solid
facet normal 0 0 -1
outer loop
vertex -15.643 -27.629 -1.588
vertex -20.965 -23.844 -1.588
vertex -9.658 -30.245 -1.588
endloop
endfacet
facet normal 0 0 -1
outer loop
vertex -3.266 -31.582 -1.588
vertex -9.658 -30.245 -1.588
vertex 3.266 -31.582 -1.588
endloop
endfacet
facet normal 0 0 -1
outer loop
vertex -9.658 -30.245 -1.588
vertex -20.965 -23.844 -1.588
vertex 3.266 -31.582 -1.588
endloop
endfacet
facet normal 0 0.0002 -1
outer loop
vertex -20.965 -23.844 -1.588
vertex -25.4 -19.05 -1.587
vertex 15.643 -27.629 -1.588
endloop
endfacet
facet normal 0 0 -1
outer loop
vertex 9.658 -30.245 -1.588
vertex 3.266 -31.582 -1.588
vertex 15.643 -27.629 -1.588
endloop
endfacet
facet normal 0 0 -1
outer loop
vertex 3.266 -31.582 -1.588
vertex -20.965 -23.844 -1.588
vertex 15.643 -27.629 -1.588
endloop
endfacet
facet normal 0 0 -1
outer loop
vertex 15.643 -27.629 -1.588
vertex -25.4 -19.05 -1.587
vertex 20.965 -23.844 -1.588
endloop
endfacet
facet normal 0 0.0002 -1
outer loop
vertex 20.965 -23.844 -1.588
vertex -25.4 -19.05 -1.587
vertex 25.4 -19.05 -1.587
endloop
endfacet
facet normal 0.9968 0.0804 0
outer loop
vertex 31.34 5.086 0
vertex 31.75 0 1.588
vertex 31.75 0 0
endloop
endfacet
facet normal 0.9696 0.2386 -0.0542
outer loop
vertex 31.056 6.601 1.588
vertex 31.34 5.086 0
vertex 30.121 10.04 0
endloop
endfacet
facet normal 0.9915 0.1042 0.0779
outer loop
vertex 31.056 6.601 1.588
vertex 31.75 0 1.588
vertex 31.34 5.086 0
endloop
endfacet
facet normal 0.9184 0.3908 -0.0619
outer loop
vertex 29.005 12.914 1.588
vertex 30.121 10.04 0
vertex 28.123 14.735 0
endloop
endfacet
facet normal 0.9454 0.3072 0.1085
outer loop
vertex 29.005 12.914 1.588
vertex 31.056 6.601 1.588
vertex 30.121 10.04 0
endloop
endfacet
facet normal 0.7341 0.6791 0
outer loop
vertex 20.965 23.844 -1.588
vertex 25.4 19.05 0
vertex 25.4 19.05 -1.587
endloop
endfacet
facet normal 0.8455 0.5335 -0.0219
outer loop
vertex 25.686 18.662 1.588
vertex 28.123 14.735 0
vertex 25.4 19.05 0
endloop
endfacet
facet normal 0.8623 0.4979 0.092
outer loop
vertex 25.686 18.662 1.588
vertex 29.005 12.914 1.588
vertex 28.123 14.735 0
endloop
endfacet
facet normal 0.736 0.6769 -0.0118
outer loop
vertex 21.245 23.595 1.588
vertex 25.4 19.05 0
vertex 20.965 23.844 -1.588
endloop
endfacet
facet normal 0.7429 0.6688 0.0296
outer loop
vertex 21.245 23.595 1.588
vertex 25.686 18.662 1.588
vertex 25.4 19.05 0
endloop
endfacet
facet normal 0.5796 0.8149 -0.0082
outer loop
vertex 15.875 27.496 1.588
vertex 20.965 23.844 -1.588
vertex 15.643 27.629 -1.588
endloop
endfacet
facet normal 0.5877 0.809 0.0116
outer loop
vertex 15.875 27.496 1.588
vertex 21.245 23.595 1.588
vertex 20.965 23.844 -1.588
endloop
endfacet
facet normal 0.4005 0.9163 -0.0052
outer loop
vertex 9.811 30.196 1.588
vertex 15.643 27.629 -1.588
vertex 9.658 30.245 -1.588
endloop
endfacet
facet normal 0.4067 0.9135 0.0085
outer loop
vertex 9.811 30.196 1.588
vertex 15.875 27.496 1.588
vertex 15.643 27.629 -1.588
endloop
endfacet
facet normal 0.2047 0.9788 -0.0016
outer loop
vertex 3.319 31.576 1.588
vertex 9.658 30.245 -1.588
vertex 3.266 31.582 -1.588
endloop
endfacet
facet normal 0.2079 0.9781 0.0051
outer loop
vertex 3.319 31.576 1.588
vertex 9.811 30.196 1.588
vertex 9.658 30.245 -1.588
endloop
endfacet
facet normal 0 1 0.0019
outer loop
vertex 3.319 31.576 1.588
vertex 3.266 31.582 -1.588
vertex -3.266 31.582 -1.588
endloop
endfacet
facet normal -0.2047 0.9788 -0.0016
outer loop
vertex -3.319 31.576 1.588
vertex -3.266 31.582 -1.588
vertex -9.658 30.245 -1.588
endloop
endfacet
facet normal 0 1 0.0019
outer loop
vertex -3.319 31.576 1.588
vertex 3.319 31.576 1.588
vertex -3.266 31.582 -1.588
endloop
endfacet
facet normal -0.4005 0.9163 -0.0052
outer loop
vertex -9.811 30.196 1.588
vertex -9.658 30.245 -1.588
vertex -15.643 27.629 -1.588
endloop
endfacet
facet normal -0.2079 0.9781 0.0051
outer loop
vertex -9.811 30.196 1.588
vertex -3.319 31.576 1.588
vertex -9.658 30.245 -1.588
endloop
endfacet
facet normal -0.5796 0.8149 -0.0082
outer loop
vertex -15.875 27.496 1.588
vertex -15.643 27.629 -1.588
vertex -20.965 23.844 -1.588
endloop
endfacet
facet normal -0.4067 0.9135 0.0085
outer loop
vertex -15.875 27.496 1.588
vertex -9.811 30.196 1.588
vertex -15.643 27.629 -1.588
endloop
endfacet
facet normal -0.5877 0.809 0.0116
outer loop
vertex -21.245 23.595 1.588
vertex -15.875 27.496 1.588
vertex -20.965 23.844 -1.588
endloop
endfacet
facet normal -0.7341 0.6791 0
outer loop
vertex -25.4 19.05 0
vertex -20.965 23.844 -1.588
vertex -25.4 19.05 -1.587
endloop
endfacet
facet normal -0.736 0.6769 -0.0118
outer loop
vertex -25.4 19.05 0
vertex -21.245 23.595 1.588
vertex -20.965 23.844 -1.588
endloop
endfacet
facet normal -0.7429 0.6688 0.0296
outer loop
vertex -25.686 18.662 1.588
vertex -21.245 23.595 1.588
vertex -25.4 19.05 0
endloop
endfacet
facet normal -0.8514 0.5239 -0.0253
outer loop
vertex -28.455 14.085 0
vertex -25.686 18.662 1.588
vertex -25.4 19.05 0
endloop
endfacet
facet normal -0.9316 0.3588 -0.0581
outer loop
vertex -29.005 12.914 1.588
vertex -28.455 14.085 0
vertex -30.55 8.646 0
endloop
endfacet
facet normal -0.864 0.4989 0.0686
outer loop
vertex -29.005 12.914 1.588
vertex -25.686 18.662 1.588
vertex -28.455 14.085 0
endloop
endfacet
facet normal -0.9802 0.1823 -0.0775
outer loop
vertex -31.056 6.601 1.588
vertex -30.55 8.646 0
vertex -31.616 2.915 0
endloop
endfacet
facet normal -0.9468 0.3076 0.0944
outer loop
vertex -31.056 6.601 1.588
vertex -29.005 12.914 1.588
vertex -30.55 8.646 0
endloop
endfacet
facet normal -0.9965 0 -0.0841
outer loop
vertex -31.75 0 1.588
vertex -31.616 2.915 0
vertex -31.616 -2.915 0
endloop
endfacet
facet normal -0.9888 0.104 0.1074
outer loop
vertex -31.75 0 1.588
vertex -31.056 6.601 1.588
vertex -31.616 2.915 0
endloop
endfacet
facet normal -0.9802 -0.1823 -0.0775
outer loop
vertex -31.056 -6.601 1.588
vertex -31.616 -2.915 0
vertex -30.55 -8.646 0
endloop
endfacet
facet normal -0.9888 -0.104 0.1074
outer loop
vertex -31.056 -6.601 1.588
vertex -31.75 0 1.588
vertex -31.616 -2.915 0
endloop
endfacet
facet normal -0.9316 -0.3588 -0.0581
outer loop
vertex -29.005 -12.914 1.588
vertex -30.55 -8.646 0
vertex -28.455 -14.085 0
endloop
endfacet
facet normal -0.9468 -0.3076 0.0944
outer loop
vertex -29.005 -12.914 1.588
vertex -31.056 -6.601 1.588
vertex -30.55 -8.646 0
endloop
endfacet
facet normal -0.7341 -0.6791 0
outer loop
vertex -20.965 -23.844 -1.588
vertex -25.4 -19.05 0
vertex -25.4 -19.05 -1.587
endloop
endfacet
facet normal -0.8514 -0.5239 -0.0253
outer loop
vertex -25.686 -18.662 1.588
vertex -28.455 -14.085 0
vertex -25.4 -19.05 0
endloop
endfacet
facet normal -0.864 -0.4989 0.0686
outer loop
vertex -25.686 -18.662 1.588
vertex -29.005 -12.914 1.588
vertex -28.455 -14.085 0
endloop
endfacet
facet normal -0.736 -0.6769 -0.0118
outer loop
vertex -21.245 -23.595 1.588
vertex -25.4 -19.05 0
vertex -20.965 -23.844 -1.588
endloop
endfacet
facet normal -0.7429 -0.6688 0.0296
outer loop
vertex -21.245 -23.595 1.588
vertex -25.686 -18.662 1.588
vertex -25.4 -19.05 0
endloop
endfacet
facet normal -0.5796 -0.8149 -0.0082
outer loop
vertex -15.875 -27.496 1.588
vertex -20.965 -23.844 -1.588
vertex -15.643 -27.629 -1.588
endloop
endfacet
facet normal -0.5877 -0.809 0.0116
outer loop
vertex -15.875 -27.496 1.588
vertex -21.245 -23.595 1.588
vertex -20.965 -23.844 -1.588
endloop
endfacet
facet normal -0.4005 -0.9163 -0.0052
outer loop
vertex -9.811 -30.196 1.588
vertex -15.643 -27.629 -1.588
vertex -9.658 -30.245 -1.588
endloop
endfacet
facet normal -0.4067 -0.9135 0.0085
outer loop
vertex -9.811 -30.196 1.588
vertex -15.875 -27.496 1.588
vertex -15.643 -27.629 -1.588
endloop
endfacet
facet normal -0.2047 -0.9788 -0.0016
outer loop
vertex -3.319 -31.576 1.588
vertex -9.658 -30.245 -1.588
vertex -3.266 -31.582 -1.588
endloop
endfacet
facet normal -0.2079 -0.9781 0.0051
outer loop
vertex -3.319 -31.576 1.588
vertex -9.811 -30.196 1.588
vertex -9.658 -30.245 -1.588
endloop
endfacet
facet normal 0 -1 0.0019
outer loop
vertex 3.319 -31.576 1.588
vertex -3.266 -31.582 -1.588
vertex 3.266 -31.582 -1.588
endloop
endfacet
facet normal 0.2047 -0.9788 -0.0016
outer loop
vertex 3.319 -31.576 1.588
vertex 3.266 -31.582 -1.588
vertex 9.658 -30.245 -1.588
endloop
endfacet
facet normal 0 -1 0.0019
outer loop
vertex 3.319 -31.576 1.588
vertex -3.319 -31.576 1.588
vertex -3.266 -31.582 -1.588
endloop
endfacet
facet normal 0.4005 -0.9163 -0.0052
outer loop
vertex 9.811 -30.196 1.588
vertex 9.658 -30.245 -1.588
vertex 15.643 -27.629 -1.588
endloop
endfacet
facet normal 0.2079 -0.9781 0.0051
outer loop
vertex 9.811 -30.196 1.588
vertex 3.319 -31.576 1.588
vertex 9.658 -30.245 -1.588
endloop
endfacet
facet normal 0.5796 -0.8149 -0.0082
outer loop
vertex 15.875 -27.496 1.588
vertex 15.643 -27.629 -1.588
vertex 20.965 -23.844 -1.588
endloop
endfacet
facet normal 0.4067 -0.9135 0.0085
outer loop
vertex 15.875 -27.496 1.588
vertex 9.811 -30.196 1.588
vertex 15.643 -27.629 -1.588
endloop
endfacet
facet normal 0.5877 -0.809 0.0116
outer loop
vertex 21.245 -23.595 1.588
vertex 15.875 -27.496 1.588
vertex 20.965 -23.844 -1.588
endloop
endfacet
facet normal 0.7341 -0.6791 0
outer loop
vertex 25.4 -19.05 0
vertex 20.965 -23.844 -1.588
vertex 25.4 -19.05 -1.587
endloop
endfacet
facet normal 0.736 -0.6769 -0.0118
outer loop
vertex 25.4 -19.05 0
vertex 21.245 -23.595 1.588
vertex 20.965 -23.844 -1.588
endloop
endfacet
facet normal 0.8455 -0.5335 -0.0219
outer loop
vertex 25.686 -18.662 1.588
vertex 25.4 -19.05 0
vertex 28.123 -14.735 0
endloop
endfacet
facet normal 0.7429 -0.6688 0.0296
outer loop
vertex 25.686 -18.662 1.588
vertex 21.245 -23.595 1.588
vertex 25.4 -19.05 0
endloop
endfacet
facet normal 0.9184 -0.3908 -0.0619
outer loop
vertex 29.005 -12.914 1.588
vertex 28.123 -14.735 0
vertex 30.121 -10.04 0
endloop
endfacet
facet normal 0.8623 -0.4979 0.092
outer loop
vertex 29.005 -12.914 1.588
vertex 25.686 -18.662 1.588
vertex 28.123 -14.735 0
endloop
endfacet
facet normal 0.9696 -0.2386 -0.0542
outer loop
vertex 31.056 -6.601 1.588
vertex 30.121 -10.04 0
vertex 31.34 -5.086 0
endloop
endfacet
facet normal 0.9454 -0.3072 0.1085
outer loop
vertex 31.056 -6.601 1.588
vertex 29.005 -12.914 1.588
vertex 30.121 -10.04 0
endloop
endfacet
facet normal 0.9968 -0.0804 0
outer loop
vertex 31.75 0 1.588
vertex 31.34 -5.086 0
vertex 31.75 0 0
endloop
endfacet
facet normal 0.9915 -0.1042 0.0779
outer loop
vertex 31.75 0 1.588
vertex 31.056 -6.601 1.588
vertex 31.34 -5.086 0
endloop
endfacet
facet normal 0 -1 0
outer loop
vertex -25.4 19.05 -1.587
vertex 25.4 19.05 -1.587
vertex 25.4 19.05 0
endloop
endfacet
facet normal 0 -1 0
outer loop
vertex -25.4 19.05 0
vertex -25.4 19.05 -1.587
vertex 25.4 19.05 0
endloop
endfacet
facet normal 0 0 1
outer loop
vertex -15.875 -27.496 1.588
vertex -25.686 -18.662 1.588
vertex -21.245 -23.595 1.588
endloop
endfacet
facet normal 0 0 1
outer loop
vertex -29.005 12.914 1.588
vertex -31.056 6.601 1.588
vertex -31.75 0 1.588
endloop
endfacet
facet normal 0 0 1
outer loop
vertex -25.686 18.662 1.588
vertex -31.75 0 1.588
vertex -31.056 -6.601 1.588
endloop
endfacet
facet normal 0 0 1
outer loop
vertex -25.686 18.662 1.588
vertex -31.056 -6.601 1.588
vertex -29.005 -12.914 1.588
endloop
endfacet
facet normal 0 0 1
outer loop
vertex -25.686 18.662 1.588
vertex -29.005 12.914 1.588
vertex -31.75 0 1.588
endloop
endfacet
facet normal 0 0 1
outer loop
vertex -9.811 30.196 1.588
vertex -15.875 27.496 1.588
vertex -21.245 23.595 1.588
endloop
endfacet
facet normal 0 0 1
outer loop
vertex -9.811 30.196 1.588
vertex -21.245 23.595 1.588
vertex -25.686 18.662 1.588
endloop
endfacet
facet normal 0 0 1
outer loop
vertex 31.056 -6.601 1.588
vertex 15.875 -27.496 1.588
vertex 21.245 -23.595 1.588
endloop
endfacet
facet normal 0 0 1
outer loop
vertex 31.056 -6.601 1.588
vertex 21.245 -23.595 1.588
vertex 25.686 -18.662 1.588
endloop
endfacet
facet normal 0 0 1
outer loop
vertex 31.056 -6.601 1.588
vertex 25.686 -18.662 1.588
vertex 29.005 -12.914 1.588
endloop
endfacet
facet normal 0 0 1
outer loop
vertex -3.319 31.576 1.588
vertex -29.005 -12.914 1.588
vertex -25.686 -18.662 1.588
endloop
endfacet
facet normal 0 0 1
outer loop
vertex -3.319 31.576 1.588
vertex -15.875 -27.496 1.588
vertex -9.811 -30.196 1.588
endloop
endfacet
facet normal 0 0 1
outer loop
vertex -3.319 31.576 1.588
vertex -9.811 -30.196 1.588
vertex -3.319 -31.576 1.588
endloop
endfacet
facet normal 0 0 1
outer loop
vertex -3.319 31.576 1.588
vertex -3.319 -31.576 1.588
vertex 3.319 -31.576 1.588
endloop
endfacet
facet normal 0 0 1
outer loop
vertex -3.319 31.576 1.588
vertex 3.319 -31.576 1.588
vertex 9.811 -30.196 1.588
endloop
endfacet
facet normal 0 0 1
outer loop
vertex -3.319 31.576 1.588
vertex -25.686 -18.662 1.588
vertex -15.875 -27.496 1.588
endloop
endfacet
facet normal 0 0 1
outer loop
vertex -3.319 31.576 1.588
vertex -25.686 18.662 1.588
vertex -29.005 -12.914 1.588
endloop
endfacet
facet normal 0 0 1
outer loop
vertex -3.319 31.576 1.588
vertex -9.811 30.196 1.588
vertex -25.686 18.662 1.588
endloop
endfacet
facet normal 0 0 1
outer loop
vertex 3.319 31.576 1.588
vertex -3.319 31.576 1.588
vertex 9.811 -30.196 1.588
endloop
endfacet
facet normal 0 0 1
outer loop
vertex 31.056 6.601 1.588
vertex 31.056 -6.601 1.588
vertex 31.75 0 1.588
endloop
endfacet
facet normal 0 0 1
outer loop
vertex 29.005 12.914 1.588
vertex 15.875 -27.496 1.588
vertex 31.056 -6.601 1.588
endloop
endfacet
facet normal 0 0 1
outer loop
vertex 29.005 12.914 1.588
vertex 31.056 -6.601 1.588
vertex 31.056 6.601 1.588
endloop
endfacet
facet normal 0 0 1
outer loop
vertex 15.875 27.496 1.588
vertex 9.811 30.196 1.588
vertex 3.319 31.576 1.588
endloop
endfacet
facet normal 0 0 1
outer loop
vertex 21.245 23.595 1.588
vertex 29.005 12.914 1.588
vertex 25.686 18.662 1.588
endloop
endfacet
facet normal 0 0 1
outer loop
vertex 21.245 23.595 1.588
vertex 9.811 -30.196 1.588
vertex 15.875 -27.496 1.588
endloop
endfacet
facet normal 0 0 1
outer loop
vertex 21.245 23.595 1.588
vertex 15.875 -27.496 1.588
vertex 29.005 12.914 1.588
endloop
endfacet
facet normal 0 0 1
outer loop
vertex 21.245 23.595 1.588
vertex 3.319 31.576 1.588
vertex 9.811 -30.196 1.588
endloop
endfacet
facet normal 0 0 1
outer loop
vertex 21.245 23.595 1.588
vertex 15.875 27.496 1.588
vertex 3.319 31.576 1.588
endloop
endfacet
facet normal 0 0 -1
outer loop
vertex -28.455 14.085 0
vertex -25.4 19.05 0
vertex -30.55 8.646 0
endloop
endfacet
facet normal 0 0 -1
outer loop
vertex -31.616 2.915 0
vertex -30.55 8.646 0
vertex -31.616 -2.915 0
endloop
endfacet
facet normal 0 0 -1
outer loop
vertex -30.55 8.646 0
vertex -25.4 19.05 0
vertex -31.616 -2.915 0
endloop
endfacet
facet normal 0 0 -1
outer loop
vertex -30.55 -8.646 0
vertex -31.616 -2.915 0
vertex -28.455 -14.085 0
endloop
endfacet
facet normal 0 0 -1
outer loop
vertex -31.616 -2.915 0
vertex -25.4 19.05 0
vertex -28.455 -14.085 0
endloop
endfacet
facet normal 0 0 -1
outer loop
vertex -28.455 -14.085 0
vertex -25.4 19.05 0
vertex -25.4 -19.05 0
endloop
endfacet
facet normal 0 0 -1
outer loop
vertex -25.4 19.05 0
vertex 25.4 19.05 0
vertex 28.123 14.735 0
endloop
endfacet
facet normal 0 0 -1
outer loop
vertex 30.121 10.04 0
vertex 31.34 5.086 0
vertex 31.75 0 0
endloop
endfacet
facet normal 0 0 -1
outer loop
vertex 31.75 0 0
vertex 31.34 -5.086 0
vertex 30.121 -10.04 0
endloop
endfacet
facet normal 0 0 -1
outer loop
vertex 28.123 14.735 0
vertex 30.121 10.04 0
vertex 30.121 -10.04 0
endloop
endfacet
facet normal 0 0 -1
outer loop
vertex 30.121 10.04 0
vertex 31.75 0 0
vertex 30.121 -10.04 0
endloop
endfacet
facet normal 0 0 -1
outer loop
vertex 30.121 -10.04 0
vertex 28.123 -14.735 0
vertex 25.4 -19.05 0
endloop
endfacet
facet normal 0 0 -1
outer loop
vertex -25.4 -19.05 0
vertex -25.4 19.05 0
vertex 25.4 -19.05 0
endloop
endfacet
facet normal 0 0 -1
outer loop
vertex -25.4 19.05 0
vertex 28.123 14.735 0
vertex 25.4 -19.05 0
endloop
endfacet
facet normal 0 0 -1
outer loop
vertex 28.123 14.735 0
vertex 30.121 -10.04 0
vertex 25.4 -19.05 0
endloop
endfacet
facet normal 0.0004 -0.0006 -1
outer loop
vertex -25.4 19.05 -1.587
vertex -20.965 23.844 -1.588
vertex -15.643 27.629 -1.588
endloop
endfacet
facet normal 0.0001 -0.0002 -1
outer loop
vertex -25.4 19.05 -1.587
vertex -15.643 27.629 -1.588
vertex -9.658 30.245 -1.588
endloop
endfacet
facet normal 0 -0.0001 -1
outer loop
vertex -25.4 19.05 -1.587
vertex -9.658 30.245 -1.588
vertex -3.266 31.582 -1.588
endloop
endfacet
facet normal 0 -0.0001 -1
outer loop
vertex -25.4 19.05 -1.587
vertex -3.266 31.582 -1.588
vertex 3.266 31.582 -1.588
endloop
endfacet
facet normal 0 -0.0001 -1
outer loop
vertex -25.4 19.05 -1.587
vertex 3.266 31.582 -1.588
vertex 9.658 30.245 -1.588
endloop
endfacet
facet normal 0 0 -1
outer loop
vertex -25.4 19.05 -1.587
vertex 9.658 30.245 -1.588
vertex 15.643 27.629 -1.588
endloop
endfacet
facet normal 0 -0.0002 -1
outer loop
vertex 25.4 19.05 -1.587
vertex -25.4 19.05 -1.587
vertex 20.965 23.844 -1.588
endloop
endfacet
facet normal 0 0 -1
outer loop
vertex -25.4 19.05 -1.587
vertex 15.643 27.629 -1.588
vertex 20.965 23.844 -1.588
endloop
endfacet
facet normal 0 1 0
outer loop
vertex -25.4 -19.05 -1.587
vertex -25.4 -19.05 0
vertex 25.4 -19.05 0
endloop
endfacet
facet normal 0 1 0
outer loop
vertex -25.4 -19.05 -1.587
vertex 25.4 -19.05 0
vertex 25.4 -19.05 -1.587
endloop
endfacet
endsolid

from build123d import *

# Parameters (mm, degrees)
SKETCH1_R    = 31.75
BASE_DEPTH   = 1.5875
TRENCH_DEPTH = 31.75


with BuildPart() as part:
    # Sketch1 → Base (new body, symmetric)
    with BuildSketch(Plane.XY):
        Circle(SKETCH1_R)
    extrude(amount=BASE_DEPTH, both=True)

    # Sketch5 → Trench (cut, symmetric)
    with BuildSketch(Plane(origin=(0, 0, 0), x_dir=(0, 0, -1), z_dir=(1, 0, 0))):
        with BuildLine():
            Line((0, -19.05), (1.5875, -19.05))
            ThreePointArc((1.5875, -19.05), (0.397561674, -9.558016141), (0, -8.92e-07))
            Line((0, -8.92e-07), (0, -19.05))
        make_face()
        with BuildLine():
            ThreePointArc((0, -8.92e-07), (0.3975616, 9.558015252), (1.5875, 19.05))
            Line((1.5875, 19.05), (0, 19.05))
            Line((0, 19.05), (0, -8.92e-07))
        make_face()
        with BuildLine():
            Line((1.5875, 19.05), (1.5875, -19.05))
            ThreePointArc((1.5875, -19.05), (0, 0), (1.5875, 19.05))
        make_face()
    extrude(amount=TRENCH_DEPTH, both=True, mode=Mode.SUBTRACT)


solid = part.part
